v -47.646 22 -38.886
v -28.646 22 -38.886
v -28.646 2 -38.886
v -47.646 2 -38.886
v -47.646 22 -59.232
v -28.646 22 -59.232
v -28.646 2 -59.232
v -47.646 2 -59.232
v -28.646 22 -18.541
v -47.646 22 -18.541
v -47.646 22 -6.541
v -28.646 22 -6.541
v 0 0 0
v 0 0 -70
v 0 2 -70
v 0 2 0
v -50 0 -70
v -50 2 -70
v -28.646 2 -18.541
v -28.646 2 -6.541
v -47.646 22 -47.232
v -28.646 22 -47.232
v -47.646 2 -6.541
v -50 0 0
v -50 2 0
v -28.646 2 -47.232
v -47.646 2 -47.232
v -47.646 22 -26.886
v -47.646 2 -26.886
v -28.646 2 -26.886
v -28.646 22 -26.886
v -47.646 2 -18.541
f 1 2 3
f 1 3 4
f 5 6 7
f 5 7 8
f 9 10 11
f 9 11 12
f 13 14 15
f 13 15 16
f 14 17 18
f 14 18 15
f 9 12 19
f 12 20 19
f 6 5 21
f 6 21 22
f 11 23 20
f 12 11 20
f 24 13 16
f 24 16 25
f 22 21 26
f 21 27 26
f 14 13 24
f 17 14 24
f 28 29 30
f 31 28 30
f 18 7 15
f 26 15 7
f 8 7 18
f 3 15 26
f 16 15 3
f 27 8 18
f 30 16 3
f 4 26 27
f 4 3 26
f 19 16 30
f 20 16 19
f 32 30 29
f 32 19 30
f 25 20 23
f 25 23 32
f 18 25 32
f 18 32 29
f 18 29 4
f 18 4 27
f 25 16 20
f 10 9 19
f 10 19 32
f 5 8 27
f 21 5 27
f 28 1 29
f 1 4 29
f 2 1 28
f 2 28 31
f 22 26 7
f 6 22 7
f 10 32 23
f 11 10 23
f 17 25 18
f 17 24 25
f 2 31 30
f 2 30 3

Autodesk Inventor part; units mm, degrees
ref_plane "YZ Plane" through (0, 0, 0) normal (1, 0, 0) x (0, 1, 0)
ref_plane "XZ Plane" through (0, 0, 0) normal (0, 1, 0) x (-1, 0, 0)
ref_plane "XY Plane" through (0, 0, 0) normal (0, 0, 1) x (1, 0, 0)
sketch "Sketch1" plane through (0, 0, 0) normal (0, 1, 0) x (-1, 0, 0)
  line L0 (0, 0) -> (50, 0)
  line L1 (50, 0) -> (50, -70)
  line L2 (50, -70) -> (0, -70)
  line L3 (0, -70) -> (0, 0)
  dimension "d0" = 50
  dimension "d1" = 70
extrude "Extrusion1" add sketch "Sketch1" along normal blind 2
sketch "Sketch2" plane through (0, 2, 0) normal (0, 1, 0) x (1, 0, 0)
  line L0 (-47.6458, 6.5409) -> (-28.6458, 6.5409)
  line L1 (-28.6458, 6.5409) -> (-28.6458, 18.5409)
  line L2 (-28.6458, 18.5409) -> (-47.6458, 18.5409)
  line L3 (-47.6458, 18.5409) -> (-47.6458, 6.5409)
  line L4 (-47.6458, 26.8862) -> (-28.6458, 26.8862)
  line L5 (-28.6458, 26.8862) -> (-28.6458, 38.8862)
  line L6 (-28.6458, 38.8862) -> (-47.6458, 38.8862)
  line L7 (-47.6458, 38.8862) -> (-47.6458, 26.8862)
  line L8 (-47.6458, 47.2315) -> (-28.6458, 47.2315)
  line L9 (-28.6458, 47.2315) -> (-28.6458, 59.2315)
  line L10 (-28.6458, 59.2315) -> (-47.6458, 59.2315)
  line L11 (-47.6458, 59.2315) -> (-47.6458, 47.2315)
  point P0 (0, 0)
  dimension "d4" = 19
  dimension "d5" = 12
  dimension "d6" = 19
  dimension "d7" = 12
  dimension "d8" = 19
  dimension "d9" = 12
extrude "Extrusion2" add sketch "Sketch2" along normal blind 20
properties part number "temp_pcb"
